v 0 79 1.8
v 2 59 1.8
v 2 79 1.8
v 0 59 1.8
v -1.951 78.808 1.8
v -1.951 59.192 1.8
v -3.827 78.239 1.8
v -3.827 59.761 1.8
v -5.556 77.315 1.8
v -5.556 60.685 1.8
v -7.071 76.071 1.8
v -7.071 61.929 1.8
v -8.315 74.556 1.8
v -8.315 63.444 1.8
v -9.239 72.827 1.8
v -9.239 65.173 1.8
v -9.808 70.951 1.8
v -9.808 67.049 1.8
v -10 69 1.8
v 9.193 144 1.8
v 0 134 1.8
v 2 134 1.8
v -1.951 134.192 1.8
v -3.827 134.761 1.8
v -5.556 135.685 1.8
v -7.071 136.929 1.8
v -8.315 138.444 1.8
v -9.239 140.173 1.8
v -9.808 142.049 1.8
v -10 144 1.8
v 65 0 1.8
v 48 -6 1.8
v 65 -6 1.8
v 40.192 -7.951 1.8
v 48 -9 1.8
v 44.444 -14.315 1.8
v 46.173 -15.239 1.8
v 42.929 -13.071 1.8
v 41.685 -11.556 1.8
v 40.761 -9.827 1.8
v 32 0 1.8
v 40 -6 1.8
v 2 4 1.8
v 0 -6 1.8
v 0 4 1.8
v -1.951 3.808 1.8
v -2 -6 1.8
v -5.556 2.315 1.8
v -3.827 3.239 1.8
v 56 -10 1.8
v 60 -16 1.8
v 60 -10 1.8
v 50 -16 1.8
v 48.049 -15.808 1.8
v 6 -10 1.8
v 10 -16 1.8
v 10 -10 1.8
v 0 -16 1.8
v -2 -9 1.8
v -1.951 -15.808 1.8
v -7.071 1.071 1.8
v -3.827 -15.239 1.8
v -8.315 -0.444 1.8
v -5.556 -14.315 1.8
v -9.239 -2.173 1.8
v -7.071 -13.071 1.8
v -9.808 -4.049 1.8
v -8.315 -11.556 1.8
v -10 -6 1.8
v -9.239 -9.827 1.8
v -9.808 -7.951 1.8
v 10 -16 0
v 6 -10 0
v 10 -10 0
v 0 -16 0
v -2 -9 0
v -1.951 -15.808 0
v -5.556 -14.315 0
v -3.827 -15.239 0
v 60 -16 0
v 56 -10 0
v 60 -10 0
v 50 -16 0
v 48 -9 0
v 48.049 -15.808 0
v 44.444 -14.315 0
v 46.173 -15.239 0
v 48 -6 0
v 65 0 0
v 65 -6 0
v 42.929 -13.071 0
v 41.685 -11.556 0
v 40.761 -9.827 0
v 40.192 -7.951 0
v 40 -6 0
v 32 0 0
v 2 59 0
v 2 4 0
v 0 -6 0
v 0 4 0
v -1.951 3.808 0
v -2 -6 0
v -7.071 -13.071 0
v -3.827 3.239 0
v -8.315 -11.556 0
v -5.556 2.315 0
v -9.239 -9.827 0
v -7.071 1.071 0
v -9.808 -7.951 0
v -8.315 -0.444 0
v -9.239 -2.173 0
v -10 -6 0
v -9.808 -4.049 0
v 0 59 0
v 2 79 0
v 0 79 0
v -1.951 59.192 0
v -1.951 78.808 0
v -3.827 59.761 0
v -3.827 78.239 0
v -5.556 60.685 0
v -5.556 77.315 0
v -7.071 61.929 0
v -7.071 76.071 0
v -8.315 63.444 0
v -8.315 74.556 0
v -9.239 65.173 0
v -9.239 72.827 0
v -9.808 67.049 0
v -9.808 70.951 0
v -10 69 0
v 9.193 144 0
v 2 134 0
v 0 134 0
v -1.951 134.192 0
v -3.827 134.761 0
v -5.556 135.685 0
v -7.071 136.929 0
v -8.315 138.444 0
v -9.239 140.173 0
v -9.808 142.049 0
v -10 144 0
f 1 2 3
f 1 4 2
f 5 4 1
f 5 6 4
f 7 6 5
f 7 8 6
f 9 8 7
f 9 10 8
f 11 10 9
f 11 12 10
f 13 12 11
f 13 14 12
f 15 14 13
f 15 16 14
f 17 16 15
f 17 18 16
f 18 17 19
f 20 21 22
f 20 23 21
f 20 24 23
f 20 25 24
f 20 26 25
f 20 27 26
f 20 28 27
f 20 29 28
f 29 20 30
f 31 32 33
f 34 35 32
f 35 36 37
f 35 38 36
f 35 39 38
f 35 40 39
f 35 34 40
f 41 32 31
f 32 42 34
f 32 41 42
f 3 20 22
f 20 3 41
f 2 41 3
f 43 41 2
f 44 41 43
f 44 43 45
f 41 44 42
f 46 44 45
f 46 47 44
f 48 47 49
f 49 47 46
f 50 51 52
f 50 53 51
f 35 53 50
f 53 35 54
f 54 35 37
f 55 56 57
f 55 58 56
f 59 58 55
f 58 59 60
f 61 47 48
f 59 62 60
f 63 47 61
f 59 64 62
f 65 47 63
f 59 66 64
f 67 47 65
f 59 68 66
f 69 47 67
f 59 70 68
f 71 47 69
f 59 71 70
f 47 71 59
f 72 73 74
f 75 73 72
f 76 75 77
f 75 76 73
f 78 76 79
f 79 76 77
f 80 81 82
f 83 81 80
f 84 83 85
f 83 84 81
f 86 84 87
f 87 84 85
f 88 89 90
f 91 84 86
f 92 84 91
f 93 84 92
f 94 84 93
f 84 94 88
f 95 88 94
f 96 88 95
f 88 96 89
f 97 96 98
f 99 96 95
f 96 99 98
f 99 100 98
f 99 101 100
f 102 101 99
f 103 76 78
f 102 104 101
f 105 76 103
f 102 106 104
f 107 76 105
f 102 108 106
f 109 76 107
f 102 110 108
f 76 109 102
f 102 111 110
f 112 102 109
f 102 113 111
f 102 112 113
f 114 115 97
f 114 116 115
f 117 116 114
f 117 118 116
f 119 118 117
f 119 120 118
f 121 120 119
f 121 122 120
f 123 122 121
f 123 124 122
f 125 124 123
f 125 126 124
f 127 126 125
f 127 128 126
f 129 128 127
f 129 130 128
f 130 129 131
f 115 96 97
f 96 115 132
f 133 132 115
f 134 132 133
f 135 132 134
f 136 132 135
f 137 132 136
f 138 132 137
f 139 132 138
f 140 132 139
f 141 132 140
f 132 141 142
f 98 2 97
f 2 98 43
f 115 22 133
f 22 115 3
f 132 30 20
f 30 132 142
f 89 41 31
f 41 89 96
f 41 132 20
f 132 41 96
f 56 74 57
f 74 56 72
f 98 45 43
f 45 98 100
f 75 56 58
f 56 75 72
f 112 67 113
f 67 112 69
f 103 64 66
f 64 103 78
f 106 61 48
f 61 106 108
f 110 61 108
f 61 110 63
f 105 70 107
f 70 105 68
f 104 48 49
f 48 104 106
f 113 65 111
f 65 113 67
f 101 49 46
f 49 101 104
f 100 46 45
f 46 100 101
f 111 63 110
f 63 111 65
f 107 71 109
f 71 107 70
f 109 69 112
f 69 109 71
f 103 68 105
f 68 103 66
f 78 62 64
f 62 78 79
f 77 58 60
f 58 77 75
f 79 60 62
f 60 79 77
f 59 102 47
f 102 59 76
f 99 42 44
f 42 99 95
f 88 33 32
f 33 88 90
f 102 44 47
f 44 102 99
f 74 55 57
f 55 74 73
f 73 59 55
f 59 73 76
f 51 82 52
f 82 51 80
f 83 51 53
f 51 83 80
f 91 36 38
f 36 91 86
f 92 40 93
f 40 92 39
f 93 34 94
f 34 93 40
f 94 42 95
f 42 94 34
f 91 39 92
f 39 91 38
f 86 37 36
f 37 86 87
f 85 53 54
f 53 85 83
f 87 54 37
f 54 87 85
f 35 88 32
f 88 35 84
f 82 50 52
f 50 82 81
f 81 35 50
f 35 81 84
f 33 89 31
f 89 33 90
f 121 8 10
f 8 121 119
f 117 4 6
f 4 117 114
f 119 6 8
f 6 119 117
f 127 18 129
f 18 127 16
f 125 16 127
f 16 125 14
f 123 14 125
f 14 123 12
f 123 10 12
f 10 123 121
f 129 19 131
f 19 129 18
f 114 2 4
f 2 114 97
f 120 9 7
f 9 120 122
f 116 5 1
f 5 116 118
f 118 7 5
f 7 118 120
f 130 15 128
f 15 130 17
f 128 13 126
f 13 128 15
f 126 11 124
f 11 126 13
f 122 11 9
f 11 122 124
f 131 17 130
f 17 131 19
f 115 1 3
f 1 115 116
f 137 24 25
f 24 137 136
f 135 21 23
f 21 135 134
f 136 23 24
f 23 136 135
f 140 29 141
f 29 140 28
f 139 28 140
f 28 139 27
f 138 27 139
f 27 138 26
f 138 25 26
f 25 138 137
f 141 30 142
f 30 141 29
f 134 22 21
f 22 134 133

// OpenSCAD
// My first OpenSCAD experiment
// 
// Enable/Disable Arm
arm = "true";    // [true:Enabled,false:Disabled]
// Enable/Disable roll
roll = "";   // [true:Enabled,false:Disabled]
// Enable/Disable spacer
spacer = ""; // [true:Enabled,false:Disabled]


// Height of the standing backpart of the arm
height_backlatch = 65;
// Height of the arm at the backside. Consider spindle diameter. 40mm is a sane value. Backlatch height is not automaticly adjusted.
height_arm = 30; // [200]
// Angle of the lower part of the arm. Set to zero for a straight arm and adjust height with "Height arm".
arm_angle = 9; // [45]
// Distance between the hooks the arm hangs on
distance_hooks = 50; // [200]
// diameter of the holder for the spool. Should be slightly less than the hole in the spool.
diameter_roll = 50; // [100]
// Width of spoolhole. Include a couple of mm margin yourself.
width_roll = 55; // [100]

// Arm thickness. Sturdiness is given by the top part so the default of 1.8 should be enough. Make sure you match the layerheight of the print otherwise you will get tolerance issues.
thickness = 1.8;
// Margin for fitting of parts. Depending on the accuracy of your printer 0.2 or 0.4 are good values.
tolerance=0.2;
// Height of the spoolguider.
spoolcarrier = 10; // [1:100]

//Maximum height of the spacer.
spacermax=4; // [10]
//Height at low end of the spacer.
spacermin=2; // [10]

/* [Hidden] */
cutoff_backlatch = 6;
lengte_arm = 2*width_roll+3*10;
uitsnede_spoolcarrier = -(diameter_roll/2)+spoolcarrier; //0 is 25mm, -25 is 0mm
echo(uitsnede_spoolcarrier=uitsnede_spoolcarrier);
show=true;
//roldraaiing=[-90,-90,0];
roldraaiing=[-90,0,0];
//rolplaatsing = [25,-10,(thickness)/2];
rolplaatsing = [height_backlatch+(diameter_roll/2)+5,0,uitsnede_spoolcarrier];
$fa=0.1;


module haakje(diepte_haakjes = 10,thickness=thickness){
difference(){
color("green"){
    union(){
        translate([0,-diepte_haakjes,0]){
            cube([10,diepte_haakjes*2,thickness]); //staander
        }
// Half boogje
        cylinder(r=diepte_haakjes,h=thickness);
    }}


color("red"){
     translate([-2,-3,-1])
    {
hull(){
    cube([10,3,thickness+2]);
    translate([8,-1,0]){
        cube([8+1,4,thickness+2]);
        }
   }
}}}
} //einde module haakje

module stopper(verhoging=2,thickness=thickness){
    //translate([-12,0,0]){
    union(){intersection(){    cube([10,10,thickness]);
    translate([10,10,0]){
cylinder(r=10,h=thickness);
    }
    
} translate([10,0,0])
cube([2,10,thickness]);
//}
}}

module stoppergat(thickness=thickness){
    translate([0,0,-tolerance])
    cube([thickness+tolerance,(diameter_roll/2)+2,10+2*tolerance]);
}



// Arm
if ( arm == "true") {
union(){
translate([2,0,0])
difference(){
cube([height_arm,lengte_arm+(10-cutoff_backlatch),thickness]); // armvlak

translate([height_arm,0,-1]){
rotate(arm_angle)
cube([2*height_arm,lengte_arm+50,thickness+2]); // schuine uitsnede
}
}

translate([0,-cutoff_backlatch,0])
difference(){
color("blue"){
    translate([0,0,0]){
        cube([height_backlatch,10,thickness]); //staander
    }
    translate([0,0,0])
    haakje();

    translate([distance_hooks,0,0])
    haakje();
    }
        translate([height_arm,+cutoff_backlatch,-1]){
        cube([height_backlatch-2,12,thickness+2]); //cutout voor staander en onderste haakje
    }
}



translate([-10,width_roll+(10-cutoff_backlatch),0])
//scale([1,-1,1])
stopper();


translate([-10,width_roll+20+(10-cutoff_backlatch),0])
scale([1,-1,1])
stopper();


translate([-10,2*width_roll+20+(10-cutoff_backlatch),0])
//scale([1,-1,1])
stopper();
}
}

//
// Top Cylinder
//
if ( roll == "true") {

translate(rolplaatsing) // lelijke translate van 0,95 omdat cirkel centered is op z as. is thickness- (tolerance/2)
rotate(roldraaiing){
    difference(){
        translate([0,0,2])
        cylinder( r=diameter_roll/2, h=lengte_arm+6);
        {translate([-(diameter_roll/2)-1,uitsnede_spoolcarrier,-1]){
           cube([diameter_roll+2,(diameter_roll)+2,lengte_arm+10+2]);
        }
    translate([-(thickness+tolerance)/2,-(diameter_roll/2)+2,-1]){
        cube([thickness+tolerance,diameter_roll,lengte_arm+2]);}
   
    translate([-(thickness+tolerance)/2,-(diameter_roll/2)-2,0])
        stoppergat();
    translate([-(thickness+tolerance)/2,-(diameter_roll/2)-2,width_roll+10])
        stoppergat();
    translate([-(thickness+tolerance)/2,-(diameter_roll/2)-2,width_roll+20])
        stoppergat();
    translate([-(thickness+tolerance)/2,-(diameter_roll/2)-2,2*width_roll+30])
        stoppergat();
    }
    }}
}
//
// Spacer
//

if ( spacer == "true") {

translate([height_backlatch+diameter_roll+50,0,0]){
   rotate([0,0,90])
difference(){
    hull(){
cube([10,20+thickness+2*tolerance,spacermax]);
cube([height_backlatch,20+thickness+2*tolerance,spacermin]);
}
translate([6,(10),-1])
{
cube([height_backlatch+2,thickness+2*tolerance,10]);
}}}
  echo("Spacer enabled");}
